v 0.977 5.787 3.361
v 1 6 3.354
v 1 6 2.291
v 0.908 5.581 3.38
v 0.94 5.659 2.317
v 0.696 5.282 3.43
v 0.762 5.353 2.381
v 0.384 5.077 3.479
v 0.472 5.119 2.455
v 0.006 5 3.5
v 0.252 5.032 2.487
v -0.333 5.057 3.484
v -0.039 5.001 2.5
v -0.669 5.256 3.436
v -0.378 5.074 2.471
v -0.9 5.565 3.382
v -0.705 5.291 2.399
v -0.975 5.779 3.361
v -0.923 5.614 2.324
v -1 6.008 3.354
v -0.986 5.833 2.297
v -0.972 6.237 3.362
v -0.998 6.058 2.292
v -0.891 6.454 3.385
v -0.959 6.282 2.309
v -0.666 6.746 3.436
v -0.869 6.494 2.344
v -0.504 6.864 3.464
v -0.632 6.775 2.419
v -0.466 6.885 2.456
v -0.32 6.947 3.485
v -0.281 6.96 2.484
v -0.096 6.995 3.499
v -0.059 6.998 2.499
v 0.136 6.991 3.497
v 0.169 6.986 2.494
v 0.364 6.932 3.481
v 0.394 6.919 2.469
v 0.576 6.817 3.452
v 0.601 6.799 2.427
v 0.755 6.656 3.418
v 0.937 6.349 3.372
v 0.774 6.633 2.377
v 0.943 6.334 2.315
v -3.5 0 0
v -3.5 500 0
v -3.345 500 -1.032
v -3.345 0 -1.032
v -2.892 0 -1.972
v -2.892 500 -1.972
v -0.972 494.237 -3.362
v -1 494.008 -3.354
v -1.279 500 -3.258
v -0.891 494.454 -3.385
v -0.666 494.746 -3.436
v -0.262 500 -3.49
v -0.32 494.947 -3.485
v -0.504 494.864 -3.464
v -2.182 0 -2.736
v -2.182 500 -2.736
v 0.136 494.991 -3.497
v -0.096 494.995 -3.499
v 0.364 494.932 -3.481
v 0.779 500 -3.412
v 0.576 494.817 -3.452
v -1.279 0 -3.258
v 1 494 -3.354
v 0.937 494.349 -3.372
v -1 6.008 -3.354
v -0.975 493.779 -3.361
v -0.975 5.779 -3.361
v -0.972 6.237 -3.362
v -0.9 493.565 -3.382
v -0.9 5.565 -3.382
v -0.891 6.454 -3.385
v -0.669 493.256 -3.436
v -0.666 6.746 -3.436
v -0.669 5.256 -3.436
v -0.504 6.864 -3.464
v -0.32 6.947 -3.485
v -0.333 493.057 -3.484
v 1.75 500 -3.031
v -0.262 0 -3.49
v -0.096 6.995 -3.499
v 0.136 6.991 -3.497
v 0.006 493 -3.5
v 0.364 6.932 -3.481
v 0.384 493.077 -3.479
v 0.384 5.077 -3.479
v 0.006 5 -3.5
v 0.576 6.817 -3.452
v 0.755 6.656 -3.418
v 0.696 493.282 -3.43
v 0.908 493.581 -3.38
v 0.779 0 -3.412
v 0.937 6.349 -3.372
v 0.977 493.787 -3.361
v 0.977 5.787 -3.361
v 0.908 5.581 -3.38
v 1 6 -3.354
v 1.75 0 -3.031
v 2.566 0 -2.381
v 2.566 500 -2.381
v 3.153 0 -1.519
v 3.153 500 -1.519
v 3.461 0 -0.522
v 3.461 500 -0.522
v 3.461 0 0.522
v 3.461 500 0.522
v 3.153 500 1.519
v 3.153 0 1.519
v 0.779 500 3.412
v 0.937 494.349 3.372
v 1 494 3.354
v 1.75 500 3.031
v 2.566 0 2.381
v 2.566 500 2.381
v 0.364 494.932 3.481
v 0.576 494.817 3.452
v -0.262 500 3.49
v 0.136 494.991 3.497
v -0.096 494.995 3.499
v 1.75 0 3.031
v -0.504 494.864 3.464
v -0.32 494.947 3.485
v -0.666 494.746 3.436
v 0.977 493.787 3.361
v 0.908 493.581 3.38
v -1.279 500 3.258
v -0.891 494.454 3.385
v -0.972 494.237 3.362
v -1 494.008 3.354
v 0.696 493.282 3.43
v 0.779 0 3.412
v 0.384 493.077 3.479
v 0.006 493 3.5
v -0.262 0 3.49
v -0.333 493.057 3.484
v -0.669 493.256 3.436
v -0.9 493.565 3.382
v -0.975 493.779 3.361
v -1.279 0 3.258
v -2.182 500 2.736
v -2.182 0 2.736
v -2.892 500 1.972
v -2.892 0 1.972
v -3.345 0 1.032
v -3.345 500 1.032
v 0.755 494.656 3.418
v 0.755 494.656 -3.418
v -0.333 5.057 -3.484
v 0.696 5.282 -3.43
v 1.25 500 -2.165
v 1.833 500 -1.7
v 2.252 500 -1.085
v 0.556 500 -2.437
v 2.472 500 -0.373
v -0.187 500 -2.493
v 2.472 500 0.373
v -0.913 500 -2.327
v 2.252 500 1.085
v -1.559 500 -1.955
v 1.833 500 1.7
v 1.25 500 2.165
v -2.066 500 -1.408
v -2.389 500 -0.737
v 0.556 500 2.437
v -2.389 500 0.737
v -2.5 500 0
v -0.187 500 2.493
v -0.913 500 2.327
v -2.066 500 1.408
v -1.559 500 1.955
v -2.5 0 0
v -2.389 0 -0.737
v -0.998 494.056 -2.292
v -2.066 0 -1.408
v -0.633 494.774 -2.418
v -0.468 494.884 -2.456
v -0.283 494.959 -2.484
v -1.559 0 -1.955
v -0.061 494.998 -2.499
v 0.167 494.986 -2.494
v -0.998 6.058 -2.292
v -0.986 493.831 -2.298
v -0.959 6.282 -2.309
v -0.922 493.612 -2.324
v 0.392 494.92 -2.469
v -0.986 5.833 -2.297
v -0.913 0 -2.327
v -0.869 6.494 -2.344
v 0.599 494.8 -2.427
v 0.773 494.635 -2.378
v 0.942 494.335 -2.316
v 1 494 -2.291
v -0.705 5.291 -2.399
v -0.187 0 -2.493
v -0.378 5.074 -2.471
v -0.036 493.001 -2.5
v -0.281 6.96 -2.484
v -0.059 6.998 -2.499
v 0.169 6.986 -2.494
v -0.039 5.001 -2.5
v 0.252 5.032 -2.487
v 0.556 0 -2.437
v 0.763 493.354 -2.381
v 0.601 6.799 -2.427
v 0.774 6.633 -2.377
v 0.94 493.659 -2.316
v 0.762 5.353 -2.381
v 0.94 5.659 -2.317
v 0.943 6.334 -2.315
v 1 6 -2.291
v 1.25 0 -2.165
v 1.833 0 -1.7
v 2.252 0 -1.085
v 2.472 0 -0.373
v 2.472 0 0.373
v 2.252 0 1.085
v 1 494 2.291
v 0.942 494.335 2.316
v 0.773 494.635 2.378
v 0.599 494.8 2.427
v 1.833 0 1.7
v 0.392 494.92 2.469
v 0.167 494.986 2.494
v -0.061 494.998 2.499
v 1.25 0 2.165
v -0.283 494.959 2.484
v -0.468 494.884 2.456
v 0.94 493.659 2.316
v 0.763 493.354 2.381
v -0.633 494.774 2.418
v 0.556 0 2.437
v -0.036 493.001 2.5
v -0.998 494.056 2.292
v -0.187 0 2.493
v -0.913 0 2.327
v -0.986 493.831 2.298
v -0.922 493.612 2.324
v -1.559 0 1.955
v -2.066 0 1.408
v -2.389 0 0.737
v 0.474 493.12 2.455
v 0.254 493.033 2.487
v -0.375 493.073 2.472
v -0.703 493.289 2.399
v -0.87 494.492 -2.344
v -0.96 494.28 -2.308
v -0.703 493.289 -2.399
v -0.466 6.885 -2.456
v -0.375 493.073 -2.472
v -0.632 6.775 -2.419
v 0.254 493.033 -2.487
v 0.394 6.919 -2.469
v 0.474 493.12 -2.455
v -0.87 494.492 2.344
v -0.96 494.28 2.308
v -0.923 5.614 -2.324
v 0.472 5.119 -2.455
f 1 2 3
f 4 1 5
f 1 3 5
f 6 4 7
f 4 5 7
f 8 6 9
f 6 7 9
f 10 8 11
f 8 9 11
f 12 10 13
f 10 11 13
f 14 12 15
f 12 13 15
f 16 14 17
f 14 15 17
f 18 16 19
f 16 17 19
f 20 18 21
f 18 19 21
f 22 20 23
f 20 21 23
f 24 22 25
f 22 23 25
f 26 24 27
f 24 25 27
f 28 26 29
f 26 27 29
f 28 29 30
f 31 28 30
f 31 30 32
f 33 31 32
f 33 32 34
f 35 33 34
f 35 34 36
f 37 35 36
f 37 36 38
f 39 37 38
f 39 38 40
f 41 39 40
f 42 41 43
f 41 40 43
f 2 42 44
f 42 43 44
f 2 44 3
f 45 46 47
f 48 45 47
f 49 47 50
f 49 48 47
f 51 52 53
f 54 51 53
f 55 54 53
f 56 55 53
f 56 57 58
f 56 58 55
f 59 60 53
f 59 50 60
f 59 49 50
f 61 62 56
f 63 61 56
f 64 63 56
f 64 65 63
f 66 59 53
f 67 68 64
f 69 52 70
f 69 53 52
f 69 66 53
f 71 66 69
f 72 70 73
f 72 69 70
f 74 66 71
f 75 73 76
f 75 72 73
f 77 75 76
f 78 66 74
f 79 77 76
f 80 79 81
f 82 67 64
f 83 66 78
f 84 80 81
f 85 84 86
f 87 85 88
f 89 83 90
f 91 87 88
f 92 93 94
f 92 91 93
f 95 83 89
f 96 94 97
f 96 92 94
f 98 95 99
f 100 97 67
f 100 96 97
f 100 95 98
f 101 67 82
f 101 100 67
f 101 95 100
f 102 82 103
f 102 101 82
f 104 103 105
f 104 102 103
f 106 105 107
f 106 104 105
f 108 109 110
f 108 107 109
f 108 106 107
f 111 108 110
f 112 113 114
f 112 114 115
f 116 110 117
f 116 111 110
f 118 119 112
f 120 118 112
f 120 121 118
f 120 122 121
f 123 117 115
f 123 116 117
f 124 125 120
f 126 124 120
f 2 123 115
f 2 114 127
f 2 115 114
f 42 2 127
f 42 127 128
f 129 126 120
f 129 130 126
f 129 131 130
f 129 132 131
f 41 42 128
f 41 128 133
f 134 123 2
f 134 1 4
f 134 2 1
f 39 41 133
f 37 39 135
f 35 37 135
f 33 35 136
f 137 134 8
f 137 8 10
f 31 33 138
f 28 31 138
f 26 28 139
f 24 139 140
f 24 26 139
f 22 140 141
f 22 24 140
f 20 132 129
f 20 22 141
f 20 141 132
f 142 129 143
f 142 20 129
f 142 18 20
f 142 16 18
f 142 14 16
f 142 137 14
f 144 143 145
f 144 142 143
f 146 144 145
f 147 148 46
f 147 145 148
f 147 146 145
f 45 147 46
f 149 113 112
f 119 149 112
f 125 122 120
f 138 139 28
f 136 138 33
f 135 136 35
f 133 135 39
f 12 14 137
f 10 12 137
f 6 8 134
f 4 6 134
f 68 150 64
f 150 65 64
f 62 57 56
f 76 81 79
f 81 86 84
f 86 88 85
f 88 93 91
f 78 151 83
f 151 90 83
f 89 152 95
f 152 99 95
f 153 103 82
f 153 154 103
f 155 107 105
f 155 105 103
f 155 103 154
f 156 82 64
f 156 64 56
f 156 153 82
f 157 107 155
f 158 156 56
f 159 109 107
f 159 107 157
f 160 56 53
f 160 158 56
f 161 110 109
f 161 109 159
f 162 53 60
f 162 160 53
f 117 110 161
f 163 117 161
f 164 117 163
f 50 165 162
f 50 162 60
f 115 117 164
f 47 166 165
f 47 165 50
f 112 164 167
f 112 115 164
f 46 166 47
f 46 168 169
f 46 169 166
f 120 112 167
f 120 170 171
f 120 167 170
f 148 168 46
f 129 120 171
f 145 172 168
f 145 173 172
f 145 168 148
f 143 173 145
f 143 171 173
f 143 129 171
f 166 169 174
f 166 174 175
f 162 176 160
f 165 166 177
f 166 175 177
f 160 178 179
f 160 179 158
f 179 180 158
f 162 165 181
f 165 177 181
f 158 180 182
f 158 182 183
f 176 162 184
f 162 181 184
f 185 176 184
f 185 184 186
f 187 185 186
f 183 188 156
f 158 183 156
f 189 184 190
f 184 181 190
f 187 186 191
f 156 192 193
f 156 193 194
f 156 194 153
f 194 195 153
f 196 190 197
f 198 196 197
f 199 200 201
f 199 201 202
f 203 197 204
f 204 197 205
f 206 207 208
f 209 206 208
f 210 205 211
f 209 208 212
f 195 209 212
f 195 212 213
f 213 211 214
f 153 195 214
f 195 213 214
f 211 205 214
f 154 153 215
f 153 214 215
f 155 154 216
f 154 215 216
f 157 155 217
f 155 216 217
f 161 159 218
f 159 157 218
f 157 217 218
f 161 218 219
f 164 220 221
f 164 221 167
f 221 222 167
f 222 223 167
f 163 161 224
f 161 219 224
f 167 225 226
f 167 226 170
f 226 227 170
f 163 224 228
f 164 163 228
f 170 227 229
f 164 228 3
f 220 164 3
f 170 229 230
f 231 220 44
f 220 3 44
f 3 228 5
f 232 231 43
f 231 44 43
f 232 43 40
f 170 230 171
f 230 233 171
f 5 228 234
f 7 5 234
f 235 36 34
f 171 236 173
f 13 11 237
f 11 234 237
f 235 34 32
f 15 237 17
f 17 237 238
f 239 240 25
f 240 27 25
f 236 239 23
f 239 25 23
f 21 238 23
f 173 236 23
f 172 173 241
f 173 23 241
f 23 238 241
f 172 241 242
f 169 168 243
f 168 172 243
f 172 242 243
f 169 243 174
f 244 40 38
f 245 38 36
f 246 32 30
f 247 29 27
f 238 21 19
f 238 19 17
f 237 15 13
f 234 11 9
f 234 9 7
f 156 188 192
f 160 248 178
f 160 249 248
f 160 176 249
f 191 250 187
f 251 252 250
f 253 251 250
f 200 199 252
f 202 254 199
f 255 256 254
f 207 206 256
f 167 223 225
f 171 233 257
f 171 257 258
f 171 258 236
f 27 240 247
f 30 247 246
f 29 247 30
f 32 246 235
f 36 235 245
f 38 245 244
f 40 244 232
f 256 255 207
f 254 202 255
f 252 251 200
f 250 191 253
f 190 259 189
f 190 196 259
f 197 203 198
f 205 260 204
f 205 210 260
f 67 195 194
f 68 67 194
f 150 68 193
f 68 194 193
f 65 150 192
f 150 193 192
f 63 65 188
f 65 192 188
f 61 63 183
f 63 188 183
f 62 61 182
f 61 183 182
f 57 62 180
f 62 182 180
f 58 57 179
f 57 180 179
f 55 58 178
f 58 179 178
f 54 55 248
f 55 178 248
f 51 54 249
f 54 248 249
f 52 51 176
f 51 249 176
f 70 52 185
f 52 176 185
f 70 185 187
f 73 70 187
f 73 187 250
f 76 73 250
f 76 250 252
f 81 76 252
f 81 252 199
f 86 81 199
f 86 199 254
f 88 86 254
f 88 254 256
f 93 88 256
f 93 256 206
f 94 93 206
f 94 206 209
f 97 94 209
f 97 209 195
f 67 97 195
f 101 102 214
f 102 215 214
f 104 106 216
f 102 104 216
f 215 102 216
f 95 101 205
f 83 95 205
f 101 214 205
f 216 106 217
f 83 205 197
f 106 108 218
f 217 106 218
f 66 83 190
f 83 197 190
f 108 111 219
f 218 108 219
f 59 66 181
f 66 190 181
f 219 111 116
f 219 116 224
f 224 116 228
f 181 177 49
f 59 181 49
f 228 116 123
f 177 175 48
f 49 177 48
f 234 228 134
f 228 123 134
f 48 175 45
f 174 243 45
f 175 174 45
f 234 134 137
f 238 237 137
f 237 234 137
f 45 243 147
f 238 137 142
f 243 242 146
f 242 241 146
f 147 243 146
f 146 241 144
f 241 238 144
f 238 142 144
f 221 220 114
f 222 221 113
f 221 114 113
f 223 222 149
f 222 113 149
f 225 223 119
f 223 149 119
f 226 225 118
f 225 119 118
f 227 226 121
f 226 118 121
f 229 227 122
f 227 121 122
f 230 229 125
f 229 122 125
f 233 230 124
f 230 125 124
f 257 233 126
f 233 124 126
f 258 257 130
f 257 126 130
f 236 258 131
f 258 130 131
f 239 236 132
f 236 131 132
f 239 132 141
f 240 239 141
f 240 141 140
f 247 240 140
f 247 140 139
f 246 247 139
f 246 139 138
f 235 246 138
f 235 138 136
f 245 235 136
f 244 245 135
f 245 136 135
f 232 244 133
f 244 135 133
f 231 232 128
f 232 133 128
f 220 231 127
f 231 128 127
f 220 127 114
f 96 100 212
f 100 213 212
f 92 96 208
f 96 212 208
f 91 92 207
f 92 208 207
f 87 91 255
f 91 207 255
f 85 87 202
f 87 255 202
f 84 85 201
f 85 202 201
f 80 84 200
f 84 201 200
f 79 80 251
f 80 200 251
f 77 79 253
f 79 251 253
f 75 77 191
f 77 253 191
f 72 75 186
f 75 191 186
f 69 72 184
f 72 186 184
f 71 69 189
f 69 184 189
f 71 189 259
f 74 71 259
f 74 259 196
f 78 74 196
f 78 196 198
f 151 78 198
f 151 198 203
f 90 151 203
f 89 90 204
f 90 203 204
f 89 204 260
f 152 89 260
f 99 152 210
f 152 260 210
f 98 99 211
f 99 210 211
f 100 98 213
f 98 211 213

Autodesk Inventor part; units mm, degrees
ref_plane "YZ Plane" through (0, 0, 0) normal (1, 0, 0) x (0, 1, 0)
ref_plane "XZ Plane" through (0, 0, 0) normal (0, 1, 0) x (-1, 0, 0)
ref_plane "XY Plane" through (0, 0, 0) normal (0, 0, 1) x (1, 0, 0)
sketch "Sketch2" plane through (0, 0, 0) normal (0, 1, 0) x (-1, 0, 0)
  circle A0 centre (0, 0) radius 3.5
  circle A1 centre (0, 0) radius 2.5
  dimension "d91" = 7
  dimension "d92" = 5
extrude "Extrusion5" add sketch "Sketch2" along normal blind 500
sketch "Sketch3" plane through (0, 0, 0) normal (0, 0, 1) x (1, 0, 0)
  line L0 (0, 0) -> (0, 6) construction
  circle A0 centre (0, 6) radius 1
  line L1 (3.5, 500) -> (-3.5, 500) projected
  line L2 (0, 500) -> (0, 494)
  circle A1 centre (0, 494) radius 1
  dimension "d95" = 6
  dimension "d96" = 2
  dimension "d97" = 6
  dimension "d98" = 2
extrude "Extrusion6" cut sketch "Sketch3" along normal blind 10 and the other way blind 10
properties part number "airfoil"
